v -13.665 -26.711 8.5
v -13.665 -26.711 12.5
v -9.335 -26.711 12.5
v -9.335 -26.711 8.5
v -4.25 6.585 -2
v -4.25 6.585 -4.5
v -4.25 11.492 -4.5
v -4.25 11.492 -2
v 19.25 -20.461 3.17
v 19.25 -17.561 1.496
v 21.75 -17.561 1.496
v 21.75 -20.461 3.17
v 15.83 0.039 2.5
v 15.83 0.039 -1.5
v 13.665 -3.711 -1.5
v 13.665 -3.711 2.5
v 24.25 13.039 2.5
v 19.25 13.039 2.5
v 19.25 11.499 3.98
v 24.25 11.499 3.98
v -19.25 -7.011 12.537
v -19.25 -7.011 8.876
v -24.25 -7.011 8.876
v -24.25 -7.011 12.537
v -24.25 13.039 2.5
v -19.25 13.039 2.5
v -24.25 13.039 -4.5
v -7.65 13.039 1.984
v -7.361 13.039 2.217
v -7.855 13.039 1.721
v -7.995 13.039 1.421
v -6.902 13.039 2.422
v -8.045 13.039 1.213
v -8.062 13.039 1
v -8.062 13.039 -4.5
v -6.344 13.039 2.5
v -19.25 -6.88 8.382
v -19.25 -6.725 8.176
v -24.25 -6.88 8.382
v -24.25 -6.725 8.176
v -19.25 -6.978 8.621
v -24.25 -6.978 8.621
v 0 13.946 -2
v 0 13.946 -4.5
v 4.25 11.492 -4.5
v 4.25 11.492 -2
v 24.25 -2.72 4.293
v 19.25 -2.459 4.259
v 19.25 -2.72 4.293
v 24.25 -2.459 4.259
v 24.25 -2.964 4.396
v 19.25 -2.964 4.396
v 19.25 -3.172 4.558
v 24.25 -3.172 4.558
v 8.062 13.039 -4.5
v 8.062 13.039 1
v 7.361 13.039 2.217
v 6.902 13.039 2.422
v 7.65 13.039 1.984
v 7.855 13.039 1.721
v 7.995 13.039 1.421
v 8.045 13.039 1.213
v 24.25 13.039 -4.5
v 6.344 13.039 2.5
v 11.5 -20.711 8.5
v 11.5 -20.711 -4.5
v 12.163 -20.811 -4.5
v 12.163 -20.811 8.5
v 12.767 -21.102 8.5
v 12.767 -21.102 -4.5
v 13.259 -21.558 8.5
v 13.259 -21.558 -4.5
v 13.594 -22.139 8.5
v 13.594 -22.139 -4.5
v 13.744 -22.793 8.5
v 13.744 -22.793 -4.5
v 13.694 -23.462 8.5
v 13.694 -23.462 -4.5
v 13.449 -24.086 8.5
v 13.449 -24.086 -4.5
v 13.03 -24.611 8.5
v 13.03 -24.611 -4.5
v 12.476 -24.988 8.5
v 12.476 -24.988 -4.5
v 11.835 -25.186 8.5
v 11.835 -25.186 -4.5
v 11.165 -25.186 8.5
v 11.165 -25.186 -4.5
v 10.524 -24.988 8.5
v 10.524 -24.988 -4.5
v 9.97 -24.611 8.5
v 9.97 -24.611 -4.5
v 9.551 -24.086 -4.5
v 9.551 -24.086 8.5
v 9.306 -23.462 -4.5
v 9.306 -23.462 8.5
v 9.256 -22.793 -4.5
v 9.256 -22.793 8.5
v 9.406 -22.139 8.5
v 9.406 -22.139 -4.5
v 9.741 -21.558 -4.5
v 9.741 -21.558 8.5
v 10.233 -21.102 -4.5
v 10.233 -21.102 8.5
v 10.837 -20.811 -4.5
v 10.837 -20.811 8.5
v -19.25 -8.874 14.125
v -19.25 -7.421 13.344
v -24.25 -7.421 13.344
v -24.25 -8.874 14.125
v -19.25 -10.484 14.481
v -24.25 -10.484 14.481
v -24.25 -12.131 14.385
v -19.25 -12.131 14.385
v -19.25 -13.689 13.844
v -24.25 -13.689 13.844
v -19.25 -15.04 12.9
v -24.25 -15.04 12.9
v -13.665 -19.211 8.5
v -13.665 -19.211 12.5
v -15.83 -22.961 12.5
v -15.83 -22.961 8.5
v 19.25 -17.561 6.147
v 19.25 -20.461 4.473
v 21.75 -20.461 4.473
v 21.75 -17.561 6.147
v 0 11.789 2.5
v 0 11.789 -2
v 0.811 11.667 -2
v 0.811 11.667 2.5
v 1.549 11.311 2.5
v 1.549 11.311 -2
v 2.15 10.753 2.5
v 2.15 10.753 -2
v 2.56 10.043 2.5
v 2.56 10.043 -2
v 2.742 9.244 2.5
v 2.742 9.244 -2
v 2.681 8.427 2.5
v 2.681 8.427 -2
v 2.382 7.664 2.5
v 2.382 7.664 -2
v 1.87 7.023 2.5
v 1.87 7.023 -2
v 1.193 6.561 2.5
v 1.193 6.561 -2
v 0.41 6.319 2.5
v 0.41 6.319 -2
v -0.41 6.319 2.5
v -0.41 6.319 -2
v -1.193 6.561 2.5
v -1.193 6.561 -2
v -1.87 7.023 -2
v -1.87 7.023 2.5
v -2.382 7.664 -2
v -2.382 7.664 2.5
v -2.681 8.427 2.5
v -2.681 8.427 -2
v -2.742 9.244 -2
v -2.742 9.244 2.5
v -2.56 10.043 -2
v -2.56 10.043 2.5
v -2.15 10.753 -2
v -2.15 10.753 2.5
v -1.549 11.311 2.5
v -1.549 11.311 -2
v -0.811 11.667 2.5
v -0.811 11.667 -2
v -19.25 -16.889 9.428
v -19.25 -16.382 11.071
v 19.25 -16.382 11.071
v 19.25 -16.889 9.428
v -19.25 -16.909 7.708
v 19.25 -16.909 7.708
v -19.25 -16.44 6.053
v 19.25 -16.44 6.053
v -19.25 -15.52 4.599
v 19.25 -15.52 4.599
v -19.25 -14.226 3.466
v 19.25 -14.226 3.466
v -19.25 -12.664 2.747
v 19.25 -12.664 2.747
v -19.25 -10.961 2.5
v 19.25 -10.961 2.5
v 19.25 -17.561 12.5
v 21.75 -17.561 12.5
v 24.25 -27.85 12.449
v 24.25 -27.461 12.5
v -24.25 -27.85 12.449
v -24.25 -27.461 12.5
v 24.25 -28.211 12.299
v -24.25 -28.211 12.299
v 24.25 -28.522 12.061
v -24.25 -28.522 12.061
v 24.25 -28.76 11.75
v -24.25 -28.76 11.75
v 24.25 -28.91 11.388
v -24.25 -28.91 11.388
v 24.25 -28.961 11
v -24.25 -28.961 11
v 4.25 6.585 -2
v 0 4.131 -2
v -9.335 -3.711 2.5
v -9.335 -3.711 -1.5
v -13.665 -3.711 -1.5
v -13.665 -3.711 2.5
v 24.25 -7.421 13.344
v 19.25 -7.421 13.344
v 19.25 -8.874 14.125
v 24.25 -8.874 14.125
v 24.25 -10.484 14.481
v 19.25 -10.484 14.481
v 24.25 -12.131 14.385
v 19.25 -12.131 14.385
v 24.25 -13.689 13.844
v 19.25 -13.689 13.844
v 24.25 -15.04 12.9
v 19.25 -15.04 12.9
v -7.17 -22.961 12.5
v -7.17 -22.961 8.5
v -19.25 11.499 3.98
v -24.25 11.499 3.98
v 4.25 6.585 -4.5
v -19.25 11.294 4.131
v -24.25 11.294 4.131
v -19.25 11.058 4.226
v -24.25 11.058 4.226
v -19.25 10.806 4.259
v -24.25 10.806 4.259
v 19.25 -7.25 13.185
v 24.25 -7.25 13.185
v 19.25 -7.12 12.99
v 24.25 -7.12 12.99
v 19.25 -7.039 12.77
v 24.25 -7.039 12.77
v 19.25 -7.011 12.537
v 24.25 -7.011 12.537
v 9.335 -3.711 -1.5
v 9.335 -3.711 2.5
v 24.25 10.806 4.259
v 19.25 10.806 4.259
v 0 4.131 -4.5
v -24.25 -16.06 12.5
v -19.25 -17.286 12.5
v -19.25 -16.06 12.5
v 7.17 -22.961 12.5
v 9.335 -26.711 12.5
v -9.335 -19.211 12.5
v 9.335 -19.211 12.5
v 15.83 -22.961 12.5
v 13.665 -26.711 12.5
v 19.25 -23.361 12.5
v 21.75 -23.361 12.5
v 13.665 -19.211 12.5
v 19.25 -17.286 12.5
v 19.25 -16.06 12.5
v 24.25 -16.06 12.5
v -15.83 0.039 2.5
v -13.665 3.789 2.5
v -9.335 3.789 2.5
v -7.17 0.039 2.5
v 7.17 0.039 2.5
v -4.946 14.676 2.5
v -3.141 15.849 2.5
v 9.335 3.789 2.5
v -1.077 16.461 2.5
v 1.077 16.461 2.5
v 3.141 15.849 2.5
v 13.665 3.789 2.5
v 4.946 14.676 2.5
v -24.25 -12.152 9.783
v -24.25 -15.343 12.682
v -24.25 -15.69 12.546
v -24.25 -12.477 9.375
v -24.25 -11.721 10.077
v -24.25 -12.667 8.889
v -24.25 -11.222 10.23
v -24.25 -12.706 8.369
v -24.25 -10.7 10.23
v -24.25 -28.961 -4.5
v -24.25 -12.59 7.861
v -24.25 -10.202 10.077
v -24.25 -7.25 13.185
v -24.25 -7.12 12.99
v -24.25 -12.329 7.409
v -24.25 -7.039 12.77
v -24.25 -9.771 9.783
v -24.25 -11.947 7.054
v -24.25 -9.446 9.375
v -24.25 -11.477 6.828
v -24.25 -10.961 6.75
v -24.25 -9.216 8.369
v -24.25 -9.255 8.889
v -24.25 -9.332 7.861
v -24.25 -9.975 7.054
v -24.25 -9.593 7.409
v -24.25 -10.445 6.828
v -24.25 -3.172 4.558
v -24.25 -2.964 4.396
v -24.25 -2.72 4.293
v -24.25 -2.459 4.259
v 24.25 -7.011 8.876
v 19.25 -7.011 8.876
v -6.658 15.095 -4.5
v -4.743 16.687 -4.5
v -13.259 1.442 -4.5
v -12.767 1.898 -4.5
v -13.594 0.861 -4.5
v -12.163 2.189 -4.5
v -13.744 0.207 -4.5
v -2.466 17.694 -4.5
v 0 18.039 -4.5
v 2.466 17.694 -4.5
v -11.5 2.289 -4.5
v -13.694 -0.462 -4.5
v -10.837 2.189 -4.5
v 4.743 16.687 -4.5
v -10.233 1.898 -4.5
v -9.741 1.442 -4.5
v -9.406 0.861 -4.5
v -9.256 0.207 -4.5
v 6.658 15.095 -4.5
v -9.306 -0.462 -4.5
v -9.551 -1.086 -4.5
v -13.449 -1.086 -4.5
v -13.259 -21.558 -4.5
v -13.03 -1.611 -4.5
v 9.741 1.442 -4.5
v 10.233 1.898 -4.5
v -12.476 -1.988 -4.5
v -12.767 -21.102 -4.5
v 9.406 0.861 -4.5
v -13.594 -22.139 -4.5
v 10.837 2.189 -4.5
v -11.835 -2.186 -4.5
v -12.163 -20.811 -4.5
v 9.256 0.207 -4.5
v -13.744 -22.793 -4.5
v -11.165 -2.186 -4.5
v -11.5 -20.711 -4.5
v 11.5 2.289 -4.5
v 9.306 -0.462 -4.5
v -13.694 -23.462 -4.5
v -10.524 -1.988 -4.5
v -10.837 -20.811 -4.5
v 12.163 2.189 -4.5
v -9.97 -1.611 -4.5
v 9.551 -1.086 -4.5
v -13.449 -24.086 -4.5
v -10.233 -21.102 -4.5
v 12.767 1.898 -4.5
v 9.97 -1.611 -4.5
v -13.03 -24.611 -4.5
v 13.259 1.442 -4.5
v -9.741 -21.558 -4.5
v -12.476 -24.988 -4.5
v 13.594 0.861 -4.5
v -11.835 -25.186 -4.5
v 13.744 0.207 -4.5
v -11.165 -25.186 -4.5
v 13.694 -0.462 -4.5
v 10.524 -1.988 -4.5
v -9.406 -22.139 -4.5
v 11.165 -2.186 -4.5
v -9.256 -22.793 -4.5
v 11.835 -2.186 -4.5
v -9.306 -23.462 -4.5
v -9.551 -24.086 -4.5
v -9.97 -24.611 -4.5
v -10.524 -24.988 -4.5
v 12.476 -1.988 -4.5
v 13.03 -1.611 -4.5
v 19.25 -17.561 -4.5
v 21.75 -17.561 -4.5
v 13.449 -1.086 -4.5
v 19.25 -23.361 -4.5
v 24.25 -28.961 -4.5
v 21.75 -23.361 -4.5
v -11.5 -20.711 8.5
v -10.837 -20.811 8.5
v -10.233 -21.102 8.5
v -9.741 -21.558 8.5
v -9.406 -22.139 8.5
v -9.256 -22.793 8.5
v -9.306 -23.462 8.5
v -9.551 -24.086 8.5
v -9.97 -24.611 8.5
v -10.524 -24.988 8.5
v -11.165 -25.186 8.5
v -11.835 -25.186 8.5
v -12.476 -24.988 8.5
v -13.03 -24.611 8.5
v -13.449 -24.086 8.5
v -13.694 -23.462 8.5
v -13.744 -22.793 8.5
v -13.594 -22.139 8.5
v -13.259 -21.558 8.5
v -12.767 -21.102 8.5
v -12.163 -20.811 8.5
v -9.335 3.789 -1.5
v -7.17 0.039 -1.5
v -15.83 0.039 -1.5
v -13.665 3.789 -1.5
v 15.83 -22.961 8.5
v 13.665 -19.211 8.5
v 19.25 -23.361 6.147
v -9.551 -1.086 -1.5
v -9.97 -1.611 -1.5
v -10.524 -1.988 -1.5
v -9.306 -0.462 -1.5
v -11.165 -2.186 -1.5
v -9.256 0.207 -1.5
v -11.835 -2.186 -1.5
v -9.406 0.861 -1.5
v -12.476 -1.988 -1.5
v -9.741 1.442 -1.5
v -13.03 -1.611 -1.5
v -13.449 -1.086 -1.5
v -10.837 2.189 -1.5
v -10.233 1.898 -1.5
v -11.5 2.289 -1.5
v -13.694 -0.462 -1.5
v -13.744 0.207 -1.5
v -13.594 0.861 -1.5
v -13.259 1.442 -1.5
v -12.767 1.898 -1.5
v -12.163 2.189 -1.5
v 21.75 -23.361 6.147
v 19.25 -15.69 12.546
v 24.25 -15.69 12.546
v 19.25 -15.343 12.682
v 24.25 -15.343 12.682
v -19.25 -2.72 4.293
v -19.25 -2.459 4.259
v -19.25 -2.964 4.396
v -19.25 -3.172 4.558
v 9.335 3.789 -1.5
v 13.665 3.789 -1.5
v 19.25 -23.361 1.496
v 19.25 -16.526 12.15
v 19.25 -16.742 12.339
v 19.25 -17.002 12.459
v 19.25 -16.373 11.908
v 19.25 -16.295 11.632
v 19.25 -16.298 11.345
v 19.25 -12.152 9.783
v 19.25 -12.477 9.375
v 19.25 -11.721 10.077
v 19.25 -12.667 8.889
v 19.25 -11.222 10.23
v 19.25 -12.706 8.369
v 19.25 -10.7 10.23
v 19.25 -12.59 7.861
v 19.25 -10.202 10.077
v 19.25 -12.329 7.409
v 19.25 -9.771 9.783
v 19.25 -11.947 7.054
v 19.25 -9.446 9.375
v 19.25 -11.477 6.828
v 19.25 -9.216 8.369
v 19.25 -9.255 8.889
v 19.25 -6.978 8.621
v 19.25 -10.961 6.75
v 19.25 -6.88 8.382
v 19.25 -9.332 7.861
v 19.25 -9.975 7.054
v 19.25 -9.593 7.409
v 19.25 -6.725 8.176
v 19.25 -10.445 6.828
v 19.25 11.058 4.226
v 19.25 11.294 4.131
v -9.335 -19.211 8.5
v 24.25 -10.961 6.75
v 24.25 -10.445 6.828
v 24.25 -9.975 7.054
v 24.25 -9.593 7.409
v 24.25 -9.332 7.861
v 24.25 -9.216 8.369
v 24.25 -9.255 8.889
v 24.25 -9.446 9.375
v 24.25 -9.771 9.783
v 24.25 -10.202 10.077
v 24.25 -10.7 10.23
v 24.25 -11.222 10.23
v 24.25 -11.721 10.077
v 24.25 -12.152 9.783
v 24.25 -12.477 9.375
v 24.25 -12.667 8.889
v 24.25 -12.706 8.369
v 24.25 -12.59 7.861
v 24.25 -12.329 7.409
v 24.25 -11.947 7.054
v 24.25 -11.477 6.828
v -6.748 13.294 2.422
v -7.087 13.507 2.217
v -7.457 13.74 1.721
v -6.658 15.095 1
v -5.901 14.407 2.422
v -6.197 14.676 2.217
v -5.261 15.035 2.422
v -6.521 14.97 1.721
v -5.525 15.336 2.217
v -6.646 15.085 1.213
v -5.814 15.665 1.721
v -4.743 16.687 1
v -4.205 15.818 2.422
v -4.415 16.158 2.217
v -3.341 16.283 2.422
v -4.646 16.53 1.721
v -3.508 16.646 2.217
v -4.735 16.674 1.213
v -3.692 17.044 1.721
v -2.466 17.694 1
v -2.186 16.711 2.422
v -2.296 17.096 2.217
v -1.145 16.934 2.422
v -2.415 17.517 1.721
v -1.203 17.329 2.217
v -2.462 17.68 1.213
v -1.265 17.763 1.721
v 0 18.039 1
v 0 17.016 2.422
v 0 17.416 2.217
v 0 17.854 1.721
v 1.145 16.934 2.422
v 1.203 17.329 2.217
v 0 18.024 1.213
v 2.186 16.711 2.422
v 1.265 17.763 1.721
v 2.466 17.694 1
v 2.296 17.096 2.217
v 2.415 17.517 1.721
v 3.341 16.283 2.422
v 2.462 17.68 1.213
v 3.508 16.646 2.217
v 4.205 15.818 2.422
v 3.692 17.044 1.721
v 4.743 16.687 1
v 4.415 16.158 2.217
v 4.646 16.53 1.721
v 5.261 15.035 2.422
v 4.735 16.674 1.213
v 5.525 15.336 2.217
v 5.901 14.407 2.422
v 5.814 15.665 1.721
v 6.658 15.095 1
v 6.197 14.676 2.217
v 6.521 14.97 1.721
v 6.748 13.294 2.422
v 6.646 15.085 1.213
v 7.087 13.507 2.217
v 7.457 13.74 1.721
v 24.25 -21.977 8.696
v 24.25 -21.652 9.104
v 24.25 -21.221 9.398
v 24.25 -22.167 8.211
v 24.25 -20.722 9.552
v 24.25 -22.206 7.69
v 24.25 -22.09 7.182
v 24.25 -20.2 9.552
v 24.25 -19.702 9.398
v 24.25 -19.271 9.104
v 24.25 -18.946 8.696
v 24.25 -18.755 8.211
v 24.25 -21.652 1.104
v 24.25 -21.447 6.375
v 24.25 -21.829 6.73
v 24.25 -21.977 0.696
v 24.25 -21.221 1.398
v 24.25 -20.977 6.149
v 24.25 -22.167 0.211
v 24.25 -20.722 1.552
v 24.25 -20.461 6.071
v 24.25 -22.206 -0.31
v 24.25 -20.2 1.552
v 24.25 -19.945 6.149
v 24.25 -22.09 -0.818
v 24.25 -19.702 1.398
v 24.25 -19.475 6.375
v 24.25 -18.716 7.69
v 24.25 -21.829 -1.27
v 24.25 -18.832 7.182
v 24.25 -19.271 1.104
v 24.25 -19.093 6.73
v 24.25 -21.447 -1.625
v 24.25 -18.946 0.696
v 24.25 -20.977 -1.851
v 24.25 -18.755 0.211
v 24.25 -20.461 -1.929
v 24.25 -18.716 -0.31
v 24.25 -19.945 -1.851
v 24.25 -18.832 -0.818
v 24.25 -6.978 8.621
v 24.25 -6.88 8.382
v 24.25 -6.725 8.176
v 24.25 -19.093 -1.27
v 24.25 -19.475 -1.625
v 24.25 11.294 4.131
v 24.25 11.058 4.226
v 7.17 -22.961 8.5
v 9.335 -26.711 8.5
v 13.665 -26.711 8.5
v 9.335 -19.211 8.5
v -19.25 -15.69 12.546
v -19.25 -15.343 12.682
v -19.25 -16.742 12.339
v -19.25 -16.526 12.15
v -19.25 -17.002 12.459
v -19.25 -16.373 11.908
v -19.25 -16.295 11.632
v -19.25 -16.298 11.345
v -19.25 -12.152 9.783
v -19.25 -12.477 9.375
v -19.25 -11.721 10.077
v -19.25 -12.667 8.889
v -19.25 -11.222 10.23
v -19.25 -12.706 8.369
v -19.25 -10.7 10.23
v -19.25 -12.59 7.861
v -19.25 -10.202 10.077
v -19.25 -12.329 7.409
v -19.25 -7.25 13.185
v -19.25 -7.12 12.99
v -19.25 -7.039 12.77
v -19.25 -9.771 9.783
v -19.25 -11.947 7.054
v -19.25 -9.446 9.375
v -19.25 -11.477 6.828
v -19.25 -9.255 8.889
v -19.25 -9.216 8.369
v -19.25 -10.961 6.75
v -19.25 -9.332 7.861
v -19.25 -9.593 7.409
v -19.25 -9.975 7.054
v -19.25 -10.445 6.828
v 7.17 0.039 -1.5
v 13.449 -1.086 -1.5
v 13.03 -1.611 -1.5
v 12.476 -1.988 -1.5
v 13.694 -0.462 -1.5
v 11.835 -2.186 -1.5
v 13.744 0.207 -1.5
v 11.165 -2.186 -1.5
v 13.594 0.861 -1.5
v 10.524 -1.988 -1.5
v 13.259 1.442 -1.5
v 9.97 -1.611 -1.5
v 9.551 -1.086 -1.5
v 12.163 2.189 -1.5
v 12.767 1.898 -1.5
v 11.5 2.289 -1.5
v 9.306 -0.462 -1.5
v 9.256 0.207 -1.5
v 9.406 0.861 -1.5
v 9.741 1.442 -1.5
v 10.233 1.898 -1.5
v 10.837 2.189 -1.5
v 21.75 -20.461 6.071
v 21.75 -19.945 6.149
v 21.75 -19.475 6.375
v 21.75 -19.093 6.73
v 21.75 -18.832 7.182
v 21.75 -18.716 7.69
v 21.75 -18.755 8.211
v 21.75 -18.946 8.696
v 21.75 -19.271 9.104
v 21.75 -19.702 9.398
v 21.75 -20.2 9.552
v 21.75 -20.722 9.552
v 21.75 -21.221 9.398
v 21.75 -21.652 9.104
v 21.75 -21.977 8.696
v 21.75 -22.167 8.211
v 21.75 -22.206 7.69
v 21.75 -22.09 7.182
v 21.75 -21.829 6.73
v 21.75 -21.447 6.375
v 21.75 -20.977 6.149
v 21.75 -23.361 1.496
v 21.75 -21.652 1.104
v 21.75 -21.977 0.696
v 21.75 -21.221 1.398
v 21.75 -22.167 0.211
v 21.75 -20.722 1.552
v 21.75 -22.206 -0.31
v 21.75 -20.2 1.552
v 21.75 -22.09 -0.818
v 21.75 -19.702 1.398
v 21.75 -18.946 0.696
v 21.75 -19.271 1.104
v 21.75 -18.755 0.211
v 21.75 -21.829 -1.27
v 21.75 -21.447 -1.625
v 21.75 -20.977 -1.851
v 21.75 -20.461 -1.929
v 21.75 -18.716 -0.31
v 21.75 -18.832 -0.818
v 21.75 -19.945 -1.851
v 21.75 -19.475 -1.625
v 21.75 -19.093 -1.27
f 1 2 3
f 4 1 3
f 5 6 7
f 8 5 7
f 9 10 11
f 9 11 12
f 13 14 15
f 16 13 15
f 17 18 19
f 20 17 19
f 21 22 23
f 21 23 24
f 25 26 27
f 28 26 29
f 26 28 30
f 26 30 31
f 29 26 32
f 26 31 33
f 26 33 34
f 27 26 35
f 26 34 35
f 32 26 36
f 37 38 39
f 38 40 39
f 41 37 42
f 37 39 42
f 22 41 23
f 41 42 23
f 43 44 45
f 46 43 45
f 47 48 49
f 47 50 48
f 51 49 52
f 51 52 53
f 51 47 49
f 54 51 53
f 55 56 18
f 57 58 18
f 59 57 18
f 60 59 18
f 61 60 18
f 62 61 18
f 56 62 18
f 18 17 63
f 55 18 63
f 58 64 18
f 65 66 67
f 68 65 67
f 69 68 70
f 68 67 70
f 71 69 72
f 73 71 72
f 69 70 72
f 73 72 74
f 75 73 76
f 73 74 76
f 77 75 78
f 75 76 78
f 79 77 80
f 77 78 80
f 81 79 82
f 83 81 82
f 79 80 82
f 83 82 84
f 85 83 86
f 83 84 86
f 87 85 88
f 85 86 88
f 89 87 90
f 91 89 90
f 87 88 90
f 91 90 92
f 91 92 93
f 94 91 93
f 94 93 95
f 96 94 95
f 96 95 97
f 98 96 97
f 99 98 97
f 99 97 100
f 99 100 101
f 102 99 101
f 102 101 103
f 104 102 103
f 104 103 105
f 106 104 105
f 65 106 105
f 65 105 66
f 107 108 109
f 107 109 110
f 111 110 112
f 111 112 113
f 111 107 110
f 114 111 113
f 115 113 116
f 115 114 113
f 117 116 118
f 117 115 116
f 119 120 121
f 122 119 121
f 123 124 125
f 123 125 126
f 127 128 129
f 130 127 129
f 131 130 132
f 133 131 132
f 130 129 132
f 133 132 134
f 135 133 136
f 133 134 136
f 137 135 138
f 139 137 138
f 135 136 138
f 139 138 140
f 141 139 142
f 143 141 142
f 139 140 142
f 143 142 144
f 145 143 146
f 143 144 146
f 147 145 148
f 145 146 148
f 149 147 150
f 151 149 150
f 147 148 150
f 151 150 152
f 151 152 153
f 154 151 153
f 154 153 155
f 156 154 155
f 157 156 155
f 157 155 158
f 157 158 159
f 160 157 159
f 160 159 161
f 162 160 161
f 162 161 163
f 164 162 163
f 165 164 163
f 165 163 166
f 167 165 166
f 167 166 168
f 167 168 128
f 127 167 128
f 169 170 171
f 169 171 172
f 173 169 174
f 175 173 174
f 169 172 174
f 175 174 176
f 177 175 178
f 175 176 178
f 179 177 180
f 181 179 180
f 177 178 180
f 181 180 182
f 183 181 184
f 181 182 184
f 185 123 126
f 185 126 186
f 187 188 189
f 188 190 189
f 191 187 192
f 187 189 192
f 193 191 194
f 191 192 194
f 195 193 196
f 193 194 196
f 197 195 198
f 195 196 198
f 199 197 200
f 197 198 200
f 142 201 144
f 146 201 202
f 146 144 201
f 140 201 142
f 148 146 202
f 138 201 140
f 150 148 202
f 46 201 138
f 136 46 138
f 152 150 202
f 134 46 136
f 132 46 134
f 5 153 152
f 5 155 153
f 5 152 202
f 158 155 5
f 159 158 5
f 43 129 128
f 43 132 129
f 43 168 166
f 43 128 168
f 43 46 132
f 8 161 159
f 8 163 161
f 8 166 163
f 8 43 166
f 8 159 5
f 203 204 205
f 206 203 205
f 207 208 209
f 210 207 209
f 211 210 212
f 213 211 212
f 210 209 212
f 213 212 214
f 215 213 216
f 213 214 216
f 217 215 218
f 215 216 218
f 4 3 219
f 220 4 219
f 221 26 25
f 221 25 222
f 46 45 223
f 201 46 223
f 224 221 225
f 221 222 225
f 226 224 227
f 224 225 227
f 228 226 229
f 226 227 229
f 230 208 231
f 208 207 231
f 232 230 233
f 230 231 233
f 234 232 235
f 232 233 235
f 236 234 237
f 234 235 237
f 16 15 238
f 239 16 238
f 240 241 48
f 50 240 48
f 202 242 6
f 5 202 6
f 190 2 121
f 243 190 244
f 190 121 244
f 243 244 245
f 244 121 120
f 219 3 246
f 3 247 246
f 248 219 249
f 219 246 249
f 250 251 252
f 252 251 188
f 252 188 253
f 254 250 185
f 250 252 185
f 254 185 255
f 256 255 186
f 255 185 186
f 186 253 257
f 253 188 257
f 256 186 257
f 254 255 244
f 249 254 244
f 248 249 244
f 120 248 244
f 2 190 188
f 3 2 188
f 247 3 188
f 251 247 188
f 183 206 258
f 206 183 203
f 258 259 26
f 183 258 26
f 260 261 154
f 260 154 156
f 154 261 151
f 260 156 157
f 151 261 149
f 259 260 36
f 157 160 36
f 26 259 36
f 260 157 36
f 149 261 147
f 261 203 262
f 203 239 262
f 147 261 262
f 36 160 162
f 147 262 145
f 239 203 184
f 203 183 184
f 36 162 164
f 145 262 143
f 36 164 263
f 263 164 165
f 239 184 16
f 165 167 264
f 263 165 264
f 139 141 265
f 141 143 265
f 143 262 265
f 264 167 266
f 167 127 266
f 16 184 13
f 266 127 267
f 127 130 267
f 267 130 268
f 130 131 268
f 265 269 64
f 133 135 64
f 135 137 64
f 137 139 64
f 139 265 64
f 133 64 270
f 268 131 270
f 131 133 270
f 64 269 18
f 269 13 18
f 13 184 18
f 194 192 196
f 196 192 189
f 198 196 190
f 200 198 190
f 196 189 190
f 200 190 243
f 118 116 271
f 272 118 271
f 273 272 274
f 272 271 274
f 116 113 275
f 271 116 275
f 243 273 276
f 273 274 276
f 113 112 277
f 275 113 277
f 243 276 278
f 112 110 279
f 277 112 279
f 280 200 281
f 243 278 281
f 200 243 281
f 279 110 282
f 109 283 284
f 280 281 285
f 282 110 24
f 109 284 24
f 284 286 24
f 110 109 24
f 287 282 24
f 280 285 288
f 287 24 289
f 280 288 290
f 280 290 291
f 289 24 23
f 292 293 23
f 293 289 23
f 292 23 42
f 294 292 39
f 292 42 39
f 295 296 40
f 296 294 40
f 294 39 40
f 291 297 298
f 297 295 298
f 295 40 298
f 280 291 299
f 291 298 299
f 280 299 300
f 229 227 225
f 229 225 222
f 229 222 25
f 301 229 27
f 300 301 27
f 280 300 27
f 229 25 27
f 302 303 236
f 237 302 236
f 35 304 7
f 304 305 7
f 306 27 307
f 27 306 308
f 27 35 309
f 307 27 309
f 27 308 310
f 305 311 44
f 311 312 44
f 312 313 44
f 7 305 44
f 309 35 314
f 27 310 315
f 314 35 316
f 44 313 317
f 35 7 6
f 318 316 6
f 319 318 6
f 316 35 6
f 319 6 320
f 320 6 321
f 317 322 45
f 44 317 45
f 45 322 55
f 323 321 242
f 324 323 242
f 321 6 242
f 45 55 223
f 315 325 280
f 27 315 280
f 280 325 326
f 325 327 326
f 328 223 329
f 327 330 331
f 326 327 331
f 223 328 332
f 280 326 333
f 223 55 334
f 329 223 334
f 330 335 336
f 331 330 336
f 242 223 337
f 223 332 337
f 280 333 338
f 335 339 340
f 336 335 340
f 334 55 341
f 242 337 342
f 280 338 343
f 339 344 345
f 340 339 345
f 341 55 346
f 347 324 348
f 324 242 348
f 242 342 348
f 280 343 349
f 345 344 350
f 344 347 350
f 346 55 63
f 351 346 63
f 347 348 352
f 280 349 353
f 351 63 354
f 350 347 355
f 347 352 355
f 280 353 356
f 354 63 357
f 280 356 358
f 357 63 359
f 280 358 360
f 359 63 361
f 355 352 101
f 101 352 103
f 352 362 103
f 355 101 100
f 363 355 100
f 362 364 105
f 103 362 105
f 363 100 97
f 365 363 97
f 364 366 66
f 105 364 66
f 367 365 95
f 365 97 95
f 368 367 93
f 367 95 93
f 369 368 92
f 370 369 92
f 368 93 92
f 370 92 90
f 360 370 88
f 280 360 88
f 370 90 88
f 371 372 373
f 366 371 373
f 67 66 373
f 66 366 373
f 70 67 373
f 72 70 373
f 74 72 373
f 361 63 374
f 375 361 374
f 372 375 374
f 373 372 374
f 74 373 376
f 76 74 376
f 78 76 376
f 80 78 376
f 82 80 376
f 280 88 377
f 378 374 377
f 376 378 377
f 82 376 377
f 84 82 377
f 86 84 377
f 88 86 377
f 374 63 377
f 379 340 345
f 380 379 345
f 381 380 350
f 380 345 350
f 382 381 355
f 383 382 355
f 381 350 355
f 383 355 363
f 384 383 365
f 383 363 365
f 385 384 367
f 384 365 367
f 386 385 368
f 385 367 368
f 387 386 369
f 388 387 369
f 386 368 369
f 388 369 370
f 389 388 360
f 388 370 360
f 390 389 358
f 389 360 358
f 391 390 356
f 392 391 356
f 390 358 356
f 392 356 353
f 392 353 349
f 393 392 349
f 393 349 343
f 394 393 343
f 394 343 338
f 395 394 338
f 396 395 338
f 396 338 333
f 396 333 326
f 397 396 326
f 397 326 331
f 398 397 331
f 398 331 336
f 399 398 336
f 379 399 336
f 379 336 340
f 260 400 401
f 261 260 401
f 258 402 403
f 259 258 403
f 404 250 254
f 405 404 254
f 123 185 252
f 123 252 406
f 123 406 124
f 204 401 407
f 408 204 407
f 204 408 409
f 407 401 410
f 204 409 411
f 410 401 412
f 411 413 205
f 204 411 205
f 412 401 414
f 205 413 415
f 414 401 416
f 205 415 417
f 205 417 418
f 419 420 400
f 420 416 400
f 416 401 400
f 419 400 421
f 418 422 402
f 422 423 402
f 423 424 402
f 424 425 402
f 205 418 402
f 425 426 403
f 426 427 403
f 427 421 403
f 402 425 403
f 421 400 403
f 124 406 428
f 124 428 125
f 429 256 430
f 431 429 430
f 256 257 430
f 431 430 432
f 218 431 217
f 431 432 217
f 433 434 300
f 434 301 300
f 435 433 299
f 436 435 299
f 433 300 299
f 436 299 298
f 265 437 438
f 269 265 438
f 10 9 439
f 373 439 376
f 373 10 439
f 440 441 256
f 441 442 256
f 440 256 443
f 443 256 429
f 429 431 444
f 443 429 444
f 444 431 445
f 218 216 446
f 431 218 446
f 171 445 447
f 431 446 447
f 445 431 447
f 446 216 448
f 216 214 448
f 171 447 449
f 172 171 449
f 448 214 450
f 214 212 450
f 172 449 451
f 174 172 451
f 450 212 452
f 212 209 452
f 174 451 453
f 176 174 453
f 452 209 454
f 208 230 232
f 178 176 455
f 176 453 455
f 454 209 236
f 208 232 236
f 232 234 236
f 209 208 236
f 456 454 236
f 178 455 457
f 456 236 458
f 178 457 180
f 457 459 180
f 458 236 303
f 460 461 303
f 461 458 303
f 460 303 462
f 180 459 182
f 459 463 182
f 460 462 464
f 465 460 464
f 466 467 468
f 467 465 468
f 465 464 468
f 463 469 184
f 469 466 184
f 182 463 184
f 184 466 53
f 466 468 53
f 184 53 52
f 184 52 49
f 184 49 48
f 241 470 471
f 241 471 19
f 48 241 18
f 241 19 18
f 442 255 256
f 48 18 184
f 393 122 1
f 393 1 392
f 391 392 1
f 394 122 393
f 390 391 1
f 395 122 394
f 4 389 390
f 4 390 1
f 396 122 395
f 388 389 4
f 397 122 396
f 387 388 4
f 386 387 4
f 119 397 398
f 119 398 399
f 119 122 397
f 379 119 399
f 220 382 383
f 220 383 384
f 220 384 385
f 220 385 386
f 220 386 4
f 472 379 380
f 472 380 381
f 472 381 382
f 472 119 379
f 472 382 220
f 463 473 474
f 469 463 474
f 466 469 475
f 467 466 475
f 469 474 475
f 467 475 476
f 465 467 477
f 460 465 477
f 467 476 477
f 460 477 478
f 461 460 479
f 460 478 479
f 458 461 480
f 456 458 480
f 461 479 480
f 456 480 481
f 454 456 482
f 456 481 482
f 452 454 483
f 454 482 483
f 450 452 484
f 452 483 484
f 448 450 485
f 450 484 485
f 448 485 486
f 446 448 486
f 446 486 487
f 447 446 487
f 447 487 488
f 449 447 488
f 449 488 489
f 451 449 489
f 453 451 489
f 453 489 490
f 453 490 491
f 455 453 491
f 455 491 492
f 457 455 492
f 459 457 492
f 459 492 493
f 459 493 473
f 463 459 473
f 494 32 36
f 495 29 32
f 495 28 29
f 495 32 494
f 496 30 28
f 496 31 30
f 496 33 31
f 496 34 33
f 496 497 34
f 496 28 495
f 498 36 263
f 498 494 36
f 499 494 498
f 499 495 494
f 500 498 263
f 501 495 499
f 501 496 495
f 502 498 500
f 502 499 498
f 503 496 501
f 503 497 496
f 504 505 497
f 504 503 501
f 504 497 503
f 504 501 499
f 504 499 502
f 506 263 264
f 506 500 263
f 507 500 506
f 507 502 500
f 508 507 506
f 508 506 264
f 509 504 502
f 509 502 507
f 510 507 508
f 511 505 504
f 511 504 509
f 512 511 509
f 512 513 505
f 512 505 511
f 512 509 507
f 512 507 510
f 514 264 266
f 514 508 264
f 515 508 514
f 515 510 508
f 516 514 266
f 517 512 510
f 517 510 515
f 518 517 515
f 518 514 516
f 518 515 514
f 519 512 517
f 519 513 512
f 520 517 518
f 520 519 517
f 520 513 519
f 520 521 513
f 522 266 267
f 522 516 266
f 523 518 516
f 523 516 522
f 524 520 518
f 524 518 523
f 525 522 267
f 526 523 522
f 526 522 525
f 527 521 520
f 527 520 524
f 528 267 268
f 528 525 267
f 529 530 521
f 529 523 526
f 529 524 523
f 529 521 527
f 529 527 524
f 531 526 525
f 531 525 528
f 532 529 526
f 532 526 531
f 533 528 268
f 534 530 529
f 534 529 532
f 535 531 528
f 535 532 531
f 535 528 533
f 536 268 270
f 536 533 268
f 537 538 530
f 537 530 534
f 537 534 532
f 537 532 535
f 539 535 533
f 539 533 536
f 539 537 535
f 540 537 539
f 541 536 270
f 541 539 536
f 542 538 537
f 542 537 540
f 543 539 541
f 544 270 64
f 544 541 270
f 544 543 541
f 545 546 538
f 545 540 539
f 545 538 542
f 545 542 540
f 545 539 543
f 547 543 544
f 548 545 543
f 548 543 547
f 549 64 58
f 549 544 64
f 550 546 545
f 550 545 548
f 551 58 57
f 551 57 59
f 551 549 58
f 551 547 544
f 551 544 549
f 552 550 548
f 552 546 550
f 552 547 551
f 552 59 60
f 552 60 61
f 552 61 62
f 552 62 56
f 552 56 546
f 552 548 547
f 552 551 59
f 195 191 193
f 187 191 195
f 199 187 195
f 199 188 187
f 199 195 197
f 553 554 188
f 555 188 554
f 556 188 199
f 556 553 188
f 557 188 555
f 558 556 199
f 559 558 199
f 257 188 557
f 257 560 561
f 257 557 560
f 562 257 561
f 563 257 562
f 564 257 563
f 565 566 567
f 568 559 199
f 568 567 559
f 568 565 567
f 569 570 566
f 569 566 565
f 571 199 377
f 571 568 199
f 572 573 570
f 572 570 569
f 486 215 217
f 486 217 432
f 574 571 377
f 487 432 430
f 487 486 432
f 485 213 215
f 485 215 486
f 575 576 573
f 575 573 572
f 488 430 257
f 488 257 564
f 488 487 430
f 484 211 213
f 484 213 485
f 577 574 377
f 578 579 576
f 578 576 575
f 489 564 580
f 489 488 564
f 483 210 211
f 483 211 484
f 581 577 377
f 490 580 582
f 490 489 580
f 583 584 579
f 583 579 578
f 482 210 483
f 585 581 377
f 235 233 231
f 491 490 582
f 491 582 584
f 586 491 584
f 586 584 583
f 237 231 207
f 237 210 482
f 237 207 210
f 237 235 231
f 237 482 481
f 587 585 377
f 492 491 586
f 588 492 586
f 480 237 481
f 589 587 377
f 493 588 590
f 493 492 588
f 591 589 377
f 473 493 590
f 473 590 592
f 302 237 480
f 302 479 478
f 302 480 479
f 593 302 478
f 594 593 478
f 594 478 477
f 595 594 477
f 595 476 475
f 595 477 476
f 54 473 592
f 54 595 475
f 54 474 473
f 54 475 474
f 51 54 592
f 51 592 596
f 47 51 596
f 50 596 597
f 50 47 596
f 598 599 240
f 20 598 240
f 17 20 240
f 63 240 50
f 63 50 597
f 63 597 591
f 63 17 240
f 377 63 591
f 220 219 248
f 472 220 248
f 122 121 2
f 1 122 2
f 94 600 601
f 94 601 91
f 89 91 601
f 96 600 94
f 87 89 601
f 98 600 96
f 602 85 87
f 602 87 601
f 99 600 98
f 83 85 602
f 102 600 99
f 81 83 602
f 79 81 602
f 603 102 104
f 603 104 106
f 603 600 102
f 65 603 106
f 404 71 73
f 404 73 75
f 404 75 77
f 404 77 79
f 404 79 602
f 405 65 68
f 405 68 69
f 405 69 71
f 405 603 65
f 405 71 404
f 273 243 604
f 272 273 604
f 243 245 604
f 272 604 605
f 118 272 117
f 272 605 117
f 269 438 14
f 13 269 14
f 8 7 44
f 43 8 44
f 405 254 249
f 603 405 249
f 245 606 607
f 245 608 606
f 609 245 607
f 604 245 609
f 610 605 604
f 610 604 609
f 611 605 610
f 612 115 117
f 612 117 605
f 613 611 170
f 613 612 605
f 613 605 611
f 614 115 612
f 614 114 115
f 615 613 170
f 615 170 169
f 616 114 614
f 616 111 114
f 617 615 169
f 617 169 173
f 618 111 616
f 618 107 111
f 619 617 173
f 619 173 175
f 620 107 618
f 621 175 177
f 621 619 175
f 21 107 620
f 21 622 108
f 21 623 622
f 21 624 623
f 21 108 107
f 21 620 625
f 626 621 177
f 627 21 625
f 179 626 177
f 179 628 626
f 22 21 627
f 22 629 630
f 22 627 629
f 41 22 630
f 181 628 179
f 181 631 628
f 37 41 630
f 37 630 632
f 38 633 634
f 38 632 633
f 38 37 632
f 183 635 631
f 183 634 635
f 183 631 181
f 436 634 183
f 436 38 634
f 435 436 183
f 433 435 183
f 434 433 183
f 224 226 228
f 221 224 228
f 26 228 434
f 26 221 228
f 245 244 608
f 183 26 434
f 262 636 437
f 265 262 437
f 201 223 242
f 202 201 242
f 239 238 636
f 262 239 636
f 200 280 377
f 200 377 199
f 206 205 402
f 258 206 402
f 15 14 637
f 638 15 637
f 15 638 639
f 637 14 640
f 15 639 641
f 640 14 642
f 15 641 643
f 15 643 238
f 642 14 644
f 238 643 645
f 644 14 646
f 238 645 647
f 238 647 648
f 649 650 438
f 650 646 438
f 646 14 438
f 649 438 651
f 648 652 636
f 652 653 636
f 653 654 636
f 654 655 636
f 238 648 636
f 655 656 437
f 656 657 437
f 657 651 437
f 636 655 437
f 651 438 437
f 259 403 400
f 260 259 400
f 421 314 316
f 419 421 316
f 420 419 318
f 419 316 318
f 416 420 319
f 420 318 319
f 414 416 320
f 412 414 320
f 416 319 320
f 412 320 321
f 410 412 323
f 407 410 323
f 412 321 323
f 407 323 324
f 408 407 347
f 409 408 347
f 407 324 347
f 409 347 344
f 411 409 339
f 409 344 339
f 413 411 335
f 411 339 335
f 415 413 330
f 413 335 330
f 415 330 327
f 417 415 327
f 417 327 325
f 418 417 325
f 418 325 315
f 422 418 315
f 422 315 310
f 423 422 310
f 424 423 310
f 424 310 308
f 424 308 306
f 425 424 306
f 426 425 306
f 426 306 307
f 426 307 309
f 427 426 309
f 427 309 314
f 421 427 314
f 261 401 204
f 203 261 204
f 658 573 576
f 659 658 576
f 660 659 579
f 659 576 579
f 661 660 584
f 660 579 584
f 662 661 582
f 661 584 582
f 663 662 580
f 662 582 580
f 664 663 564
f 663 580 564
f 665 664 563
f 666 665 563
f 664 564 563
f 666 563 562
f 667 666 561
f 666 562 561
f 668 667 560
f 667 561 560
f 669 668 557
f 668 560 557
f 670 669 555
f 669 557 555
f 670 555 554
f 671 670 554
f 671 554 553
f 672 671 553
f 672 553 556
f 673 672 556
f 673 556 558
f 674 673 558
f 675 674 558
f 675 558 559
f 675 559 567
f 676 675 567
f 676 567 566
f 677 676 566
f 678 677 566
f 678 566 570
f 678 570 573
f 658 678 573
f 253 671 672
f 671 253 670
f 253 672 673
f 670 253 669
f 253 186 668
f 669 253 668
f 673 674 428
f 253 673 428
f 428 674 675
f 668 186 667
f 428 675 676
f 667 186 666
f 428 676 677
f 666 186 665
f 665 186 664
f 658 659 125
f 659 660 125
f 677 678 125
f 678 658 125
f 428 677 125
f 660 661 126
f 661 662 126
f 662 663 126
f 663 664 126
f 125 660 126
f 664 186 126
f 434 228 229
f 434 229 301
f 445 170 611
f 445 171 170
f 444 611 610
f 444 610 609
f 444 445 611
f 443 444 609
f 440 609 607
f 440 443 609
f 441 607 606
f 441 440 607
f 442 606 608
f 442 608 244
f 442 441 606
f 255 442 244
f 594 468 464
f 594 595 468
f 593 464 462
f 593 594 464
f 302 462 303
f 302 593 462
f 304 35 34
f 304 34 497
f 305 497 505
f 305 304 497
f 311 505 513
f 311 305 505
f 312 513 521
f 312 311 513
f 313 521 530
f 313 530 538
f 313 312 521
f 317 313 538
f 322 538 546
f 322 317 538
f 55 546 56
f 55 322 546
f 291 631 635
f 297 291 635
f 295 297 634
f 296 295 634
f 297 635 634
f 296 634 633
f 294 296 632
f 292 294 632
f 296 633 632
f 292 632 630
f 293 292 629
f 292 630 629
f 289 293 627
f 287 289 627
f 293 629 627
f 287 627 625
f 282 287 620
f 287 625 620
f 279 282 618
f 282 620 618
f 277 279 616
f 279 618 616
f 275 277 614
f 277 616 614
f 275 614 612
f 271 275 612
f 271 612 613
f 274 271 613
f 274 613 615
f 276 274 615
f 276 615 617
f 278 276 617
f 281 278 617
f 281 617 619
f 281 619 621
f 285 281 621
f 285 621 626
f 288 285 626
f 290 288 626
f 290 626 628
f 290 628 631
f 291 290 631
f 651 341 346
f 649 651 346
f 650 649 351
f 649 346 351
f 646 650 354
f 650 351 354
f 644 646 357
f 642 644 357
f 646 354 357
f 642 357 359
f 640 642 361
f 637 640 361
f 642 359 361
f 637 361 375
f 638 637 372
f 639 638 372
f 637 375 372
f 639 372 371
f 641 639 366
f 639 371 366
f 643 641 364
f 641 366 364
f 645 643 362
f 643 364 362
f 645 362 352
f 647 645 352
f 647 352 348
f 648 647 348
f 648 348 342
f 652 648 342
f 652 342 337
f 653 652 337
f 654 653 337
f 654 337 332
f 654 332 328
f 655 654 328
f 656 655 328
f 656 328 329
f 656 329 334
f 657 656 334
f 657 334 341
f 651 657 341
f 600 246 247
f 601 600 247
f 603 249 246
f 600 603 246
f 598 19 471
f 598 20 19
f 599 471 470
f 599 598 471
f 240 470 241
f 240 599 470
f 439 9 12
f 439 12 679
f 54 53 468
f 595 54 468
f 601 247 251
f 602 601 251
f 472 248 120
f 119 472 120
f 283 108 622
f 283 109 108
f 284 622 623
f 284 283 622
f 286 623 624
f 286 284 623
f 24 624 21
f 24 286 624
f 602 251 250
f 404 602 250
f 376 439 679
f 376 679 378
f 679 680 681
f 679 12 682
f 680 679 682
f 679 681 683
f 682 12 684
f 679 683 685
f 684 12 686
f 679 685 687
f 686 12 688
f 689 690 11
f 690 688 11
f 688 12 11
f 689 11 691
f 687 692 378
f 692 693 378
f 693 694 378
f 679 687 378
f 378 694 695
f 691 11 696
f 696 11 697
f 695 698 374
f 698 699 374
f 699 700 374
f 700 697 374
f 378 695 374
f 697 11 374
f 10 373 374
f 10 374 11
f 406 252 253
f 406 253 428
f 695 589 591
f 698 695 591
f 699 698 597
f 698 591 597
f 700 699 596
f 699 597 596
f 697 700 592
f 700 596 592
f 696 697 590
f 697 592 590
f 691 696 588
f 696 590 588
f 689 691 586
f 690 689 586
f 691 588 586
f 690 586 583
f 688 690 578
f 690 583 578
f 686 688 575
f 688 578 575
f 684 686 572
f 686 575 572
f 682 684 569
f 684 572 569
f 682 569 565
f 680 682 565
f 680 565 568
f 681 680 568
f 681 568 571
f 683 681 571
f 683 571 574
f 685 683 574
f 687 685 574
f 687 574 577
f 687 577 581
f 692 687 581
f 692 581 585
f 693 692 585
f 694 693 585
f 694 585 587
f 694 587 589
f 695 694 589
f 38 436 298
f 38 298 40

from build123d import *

# Parameters (mm, degrees)
BOSS_EXTRUDE1_DEPTH = 24.25
BOSS_EXTRUDE2_DEPTH = 7
SKETCH2_R           = 2.25
SKETCH2_R_2         = 2.75
CUT_EXTRUDE1_DEPTH  = 30
RIB2_START          = -5
RIB2_DEPTH          = 5
SKETCH11_R          = 1.75
CUT_EXTRUDE3_DEPTH  = 59.320283327
CUT_EXTRUDE5_DEPTH  = 4
CUT_EXTRUDE6_DEPTH  = 2.5
FILLET1_R           = 1
CUT_EXTRUDE7_DEPTH  = 4
FILLET2_R           = 1.5
SKETCH16_R          = 1.75
CUT_EXTRUDE8_DEPTH  = 5
CUT_EXTRUDE11_DEPTH = 2.5


# Read off the part's stored shape, not the designer's step: Rib2
with BuildPart() as part:
    # Sketch1 → Boss-Extrude1 (new, symmetric)
    with BuildSketch(Plane(origin=(0, 0, 0), x_dir=(0, 0, -1), z_dir=(1, 0, 0))):
        with BuildLine():
            Line((-2.5, 13.03872504), (4.5, 13.03872504))
            Line((4.5, 13.03872504), (4.5, -28.96127496))
            Line((4.5, -28.96127496), (-12.5, -28.96127496))
            Line((-12.5, -28.96127496), (-12.5, -15.433410915))
            ThreePointArc((-12.5, -15.433410915), (-6.050510257, -16.438500535), (-2.5, -10.96127496))
            Line((-2.5, -10.96127496), (-2.5, 13.03872504))
        make_face()
    extrude(amount=BOSS_EXTRUDE1_DEPTH, both=True)

    # Sketch8 → Boss-Extrude2 (add)
    with BuildSketch(Plane(origin=(0, 0, -4.5), x_dir=(-1, 0, 0), z_dir=(0, 0, -1))):
        with BuildLine():
            Line((-8.062257748, 13.03872504), (8.062257748, 13.03872504))
            ThreePointArc((8.062257748, 13.03872504), (0, 18.03872504), (-8.062257748, 13.03872504))
        make_face()
    extrude(amount=-BOSS_EXTRUDE2_DEPTH)

    # Sketch2 → Cut-Extrude1 (cut)
    with BuildSketch(Plane(origin=(0, 0, -4.5), x_dir=(-1, 0, 0), z_dir=(0, 0, -1))):
        with Locations(Location((11.5, 0.03872504, 0), (0, 0, 90))):
            Circle(SKETCH2_R)
        with Locations(Location((-11.5, 0.03872504, 0), (0, 0, 90))):
            Circle(SKETCH2_R)
        with Locations(Location((-11.5, -22.96127496, 0), (0, 0, 90))):
            Circle(SKETCH2_R)
        with Locations(Location((11.5, -22.96127496, 0), (0, 0, 90))):
            Circle(SKETCH2_R)
        with Locations(Location((0, 9.03872504, 0), (0, 0, 90))):
            Circle(SKETCH2_R_2)
    extrude(amount=-CUT_EXTRUDE1_DEPTH, mode=Mode.SUBTRACT)

    # Rib2 outline → Rib2 (add)
    with BuildSketch(Plane(origin=(24.25, 0, 0), x_dir=(0, 0, -1), z_dir=(1, 0, 0)).offset(RIB2_START)):
        with BuildLine():
            Line((-2.5, 13.03872504), (-4.258517887, 11.208482718))
            Line((-4.258517887, 11.208482718), (-4.258517887, -2.878129508))
            Line((-4.258517887, -2.878129508), (-8.467587637, -7.01127496))
            Line((-8.467587637, -7.01127496), (-13.016359153, -7.01127496))
            ThreePointArc((-13.016359153, -7.01127496), (-14.488755031, -11.328444107), (-12.5, -15.433410915))
            ThreePointArc((-12.5, -15.433410915), (-6.050510257, -16.438500535), (-2.5, -10.96127496))
            Line((-2.5, -10.96127496), (-2.5, 13.03872504))
        make_face()
    rib2 = extrude(amount=RIB2_DEPTH)

    # Mirror1: Rib2 across plane
    add(rib2.mirror(Plane(origin=(0, 0, 0), x_dir=(0, 0, 1), z_dir=(1, 0, 0))))

    # Sketch11 → Cut-Extrude3 (cut, through all)
    with BuildSketch(Plane(origin=(24.25, 0, 0), x_dir=(0, 0, -1), z_dir=(1, 0, 0))):
        with Locations((-8.5, -10.96127496)):
            Circle(SKETCH11_R)
    extrude(amount=-CUT_EXTRUDE3_DEPTH, mode=Mode.SUBTRACT)

    # Sketch12 → Cut-Extrude5 (cut)
    with BuildSketch(Plane(origin=(0, 0, -1.5), x_dir=(-1, 0, 0), z_dir=(0, 0, -1))):
        Polygon((15.830127019, 0.03872504), (13.665063509, 3.78872504), (9.334936491, 3.78872504), (7.169872981, 0.03872504), (9.334936491, -3.71127496), (13.665063509, -3.71127496), align=None)
        Polygon((-7.169872981, 0.03872504), (-9.334936491, 3.78872504), (-13.665063509, 3.78872504), (-15.830127019, 0.03872504), (-13.665063509, -3.71127496), (-9.334936491, -3.71127496), align=None)
    extrude(amount=-CUT_EXTRUDE5_DEPTH, mode=Mode.SUBTRACT)

    # Sketch14 → Cut-Extrude6 (cut)
    with BuildSketch(Plane(origin=(0, 0, -4.5), x_dir=(-1, 0, 0), z_dir=(0, 0, -1))):
        Polygon((0, 13.946202328), (-4.25, 11.492463684), (-4.25, 6.584986396), (0, 4.131247752), (4.25, 6.584986396), (4.25, 11.492463684), align=None)
    extrude(amount=-CUT_EXTRUDE6_DEPTH, mode=Mode.SUBTRACT)

    # Fillet1
    fillet1_edges = [part.edges().sort_by_distance(p)[0] for p in [
        (0, -15.433410915, 12.5),
        (21.75, -2.878129508, 4.258517887),
        (21.75, -7.01127496, 8.467587637),
        (21.75, -7.01127496, 13.016359153),
        (21.75, 11.208482718, 4.258517887),
        (-21.75, -7.01127496, 13.016359153),
        (-21.75, -7.01127496, 8.467587637),
        (-21.75, -2.878129508, 4.258517887),
        (-21.75, 11.208482718, 4.258517887),
    ]]
    fillet(fillet1_edges, radius=FILLET1_R)

    # Sketch15 → Cut-Extrude7 (cut)
    with BuildSketch(Plane.XY.offset(12.5)):
        Polygon((-7.169872981, -22.96127496), (-9.334936491, -19.21127496), (-13.665063509, -19.21127496), (-15.830127019, -22.96127496), (-13.665063509, -26.71127496), (-9.334936491, -26.71127496), align=None)
        Polygon((15.830127019, -22.96127496), (13.665063509, -19.21127496), (9.334936491, -19.21127496), (7.169872981, -22.96127496), (9.334936491, -26.71127496), (13.665063509, -26.71127496), align=None)
    extrude(amount=-CUT_EXTRUDE7_DEPTH, mode=Mode.SUBTRACT)

    # Fillet2
    fillet2_edges = [part.edges().sort_by_distance(p)[0] for p in [
        (0, -28.96127496, 12.5),
        (21.75, -15.433410915, 12.5),
        (0, 18.03872504, 2.5),
        (-21.75, -15.433410915, 12.5),
    ]]
    fillet(fillet2_edges, radius=FILLET2_R)

    # Sketch16 → Cut-Extrude8 (cut)
    with BuildSketch(Plane(origin=(24.25, 0, 0), x_dir=(0, 0, -1), z_dir=(1, 0, 0))):
        with Locations((0.178756589, -20.46127496)):
            Circle(SKETCH16_R)
        with Locations((-7.821243411, -20.46127496)):
            Circle(SKETCH16_R)
    extrude(amount=-CUT_EXTRUDE8_DEPTH, mode=Mode.SUBTRACT)

    # Sketch18 → Cut-Extrude11 (cut)
    with BuildSketch(Plane(origin=(19.25, 0, 0), x_dir=(0, 0, -1), z_dir=(1, 0, 0))):
        Polygon((-6.146927631, -17.56127496), (-12.752223074, -17.56127496), (-12.752223074, -23.36127496), (-6.146927631, -23.36127496), (-4.47261185, -20.46127496), align=None)
        Polygon((-1.495559192, -23.36127496), (4.713363878, -23.36127496), (4.713363878, -17.56127496), (-1.495559192, -17.56127496), (-3.169874973, -20.46127496), align=None)
    extrude(amount=CUT_EXTRUDE11_DEPTH, mode=Mode.SUBTRACT)


solid = part.part
